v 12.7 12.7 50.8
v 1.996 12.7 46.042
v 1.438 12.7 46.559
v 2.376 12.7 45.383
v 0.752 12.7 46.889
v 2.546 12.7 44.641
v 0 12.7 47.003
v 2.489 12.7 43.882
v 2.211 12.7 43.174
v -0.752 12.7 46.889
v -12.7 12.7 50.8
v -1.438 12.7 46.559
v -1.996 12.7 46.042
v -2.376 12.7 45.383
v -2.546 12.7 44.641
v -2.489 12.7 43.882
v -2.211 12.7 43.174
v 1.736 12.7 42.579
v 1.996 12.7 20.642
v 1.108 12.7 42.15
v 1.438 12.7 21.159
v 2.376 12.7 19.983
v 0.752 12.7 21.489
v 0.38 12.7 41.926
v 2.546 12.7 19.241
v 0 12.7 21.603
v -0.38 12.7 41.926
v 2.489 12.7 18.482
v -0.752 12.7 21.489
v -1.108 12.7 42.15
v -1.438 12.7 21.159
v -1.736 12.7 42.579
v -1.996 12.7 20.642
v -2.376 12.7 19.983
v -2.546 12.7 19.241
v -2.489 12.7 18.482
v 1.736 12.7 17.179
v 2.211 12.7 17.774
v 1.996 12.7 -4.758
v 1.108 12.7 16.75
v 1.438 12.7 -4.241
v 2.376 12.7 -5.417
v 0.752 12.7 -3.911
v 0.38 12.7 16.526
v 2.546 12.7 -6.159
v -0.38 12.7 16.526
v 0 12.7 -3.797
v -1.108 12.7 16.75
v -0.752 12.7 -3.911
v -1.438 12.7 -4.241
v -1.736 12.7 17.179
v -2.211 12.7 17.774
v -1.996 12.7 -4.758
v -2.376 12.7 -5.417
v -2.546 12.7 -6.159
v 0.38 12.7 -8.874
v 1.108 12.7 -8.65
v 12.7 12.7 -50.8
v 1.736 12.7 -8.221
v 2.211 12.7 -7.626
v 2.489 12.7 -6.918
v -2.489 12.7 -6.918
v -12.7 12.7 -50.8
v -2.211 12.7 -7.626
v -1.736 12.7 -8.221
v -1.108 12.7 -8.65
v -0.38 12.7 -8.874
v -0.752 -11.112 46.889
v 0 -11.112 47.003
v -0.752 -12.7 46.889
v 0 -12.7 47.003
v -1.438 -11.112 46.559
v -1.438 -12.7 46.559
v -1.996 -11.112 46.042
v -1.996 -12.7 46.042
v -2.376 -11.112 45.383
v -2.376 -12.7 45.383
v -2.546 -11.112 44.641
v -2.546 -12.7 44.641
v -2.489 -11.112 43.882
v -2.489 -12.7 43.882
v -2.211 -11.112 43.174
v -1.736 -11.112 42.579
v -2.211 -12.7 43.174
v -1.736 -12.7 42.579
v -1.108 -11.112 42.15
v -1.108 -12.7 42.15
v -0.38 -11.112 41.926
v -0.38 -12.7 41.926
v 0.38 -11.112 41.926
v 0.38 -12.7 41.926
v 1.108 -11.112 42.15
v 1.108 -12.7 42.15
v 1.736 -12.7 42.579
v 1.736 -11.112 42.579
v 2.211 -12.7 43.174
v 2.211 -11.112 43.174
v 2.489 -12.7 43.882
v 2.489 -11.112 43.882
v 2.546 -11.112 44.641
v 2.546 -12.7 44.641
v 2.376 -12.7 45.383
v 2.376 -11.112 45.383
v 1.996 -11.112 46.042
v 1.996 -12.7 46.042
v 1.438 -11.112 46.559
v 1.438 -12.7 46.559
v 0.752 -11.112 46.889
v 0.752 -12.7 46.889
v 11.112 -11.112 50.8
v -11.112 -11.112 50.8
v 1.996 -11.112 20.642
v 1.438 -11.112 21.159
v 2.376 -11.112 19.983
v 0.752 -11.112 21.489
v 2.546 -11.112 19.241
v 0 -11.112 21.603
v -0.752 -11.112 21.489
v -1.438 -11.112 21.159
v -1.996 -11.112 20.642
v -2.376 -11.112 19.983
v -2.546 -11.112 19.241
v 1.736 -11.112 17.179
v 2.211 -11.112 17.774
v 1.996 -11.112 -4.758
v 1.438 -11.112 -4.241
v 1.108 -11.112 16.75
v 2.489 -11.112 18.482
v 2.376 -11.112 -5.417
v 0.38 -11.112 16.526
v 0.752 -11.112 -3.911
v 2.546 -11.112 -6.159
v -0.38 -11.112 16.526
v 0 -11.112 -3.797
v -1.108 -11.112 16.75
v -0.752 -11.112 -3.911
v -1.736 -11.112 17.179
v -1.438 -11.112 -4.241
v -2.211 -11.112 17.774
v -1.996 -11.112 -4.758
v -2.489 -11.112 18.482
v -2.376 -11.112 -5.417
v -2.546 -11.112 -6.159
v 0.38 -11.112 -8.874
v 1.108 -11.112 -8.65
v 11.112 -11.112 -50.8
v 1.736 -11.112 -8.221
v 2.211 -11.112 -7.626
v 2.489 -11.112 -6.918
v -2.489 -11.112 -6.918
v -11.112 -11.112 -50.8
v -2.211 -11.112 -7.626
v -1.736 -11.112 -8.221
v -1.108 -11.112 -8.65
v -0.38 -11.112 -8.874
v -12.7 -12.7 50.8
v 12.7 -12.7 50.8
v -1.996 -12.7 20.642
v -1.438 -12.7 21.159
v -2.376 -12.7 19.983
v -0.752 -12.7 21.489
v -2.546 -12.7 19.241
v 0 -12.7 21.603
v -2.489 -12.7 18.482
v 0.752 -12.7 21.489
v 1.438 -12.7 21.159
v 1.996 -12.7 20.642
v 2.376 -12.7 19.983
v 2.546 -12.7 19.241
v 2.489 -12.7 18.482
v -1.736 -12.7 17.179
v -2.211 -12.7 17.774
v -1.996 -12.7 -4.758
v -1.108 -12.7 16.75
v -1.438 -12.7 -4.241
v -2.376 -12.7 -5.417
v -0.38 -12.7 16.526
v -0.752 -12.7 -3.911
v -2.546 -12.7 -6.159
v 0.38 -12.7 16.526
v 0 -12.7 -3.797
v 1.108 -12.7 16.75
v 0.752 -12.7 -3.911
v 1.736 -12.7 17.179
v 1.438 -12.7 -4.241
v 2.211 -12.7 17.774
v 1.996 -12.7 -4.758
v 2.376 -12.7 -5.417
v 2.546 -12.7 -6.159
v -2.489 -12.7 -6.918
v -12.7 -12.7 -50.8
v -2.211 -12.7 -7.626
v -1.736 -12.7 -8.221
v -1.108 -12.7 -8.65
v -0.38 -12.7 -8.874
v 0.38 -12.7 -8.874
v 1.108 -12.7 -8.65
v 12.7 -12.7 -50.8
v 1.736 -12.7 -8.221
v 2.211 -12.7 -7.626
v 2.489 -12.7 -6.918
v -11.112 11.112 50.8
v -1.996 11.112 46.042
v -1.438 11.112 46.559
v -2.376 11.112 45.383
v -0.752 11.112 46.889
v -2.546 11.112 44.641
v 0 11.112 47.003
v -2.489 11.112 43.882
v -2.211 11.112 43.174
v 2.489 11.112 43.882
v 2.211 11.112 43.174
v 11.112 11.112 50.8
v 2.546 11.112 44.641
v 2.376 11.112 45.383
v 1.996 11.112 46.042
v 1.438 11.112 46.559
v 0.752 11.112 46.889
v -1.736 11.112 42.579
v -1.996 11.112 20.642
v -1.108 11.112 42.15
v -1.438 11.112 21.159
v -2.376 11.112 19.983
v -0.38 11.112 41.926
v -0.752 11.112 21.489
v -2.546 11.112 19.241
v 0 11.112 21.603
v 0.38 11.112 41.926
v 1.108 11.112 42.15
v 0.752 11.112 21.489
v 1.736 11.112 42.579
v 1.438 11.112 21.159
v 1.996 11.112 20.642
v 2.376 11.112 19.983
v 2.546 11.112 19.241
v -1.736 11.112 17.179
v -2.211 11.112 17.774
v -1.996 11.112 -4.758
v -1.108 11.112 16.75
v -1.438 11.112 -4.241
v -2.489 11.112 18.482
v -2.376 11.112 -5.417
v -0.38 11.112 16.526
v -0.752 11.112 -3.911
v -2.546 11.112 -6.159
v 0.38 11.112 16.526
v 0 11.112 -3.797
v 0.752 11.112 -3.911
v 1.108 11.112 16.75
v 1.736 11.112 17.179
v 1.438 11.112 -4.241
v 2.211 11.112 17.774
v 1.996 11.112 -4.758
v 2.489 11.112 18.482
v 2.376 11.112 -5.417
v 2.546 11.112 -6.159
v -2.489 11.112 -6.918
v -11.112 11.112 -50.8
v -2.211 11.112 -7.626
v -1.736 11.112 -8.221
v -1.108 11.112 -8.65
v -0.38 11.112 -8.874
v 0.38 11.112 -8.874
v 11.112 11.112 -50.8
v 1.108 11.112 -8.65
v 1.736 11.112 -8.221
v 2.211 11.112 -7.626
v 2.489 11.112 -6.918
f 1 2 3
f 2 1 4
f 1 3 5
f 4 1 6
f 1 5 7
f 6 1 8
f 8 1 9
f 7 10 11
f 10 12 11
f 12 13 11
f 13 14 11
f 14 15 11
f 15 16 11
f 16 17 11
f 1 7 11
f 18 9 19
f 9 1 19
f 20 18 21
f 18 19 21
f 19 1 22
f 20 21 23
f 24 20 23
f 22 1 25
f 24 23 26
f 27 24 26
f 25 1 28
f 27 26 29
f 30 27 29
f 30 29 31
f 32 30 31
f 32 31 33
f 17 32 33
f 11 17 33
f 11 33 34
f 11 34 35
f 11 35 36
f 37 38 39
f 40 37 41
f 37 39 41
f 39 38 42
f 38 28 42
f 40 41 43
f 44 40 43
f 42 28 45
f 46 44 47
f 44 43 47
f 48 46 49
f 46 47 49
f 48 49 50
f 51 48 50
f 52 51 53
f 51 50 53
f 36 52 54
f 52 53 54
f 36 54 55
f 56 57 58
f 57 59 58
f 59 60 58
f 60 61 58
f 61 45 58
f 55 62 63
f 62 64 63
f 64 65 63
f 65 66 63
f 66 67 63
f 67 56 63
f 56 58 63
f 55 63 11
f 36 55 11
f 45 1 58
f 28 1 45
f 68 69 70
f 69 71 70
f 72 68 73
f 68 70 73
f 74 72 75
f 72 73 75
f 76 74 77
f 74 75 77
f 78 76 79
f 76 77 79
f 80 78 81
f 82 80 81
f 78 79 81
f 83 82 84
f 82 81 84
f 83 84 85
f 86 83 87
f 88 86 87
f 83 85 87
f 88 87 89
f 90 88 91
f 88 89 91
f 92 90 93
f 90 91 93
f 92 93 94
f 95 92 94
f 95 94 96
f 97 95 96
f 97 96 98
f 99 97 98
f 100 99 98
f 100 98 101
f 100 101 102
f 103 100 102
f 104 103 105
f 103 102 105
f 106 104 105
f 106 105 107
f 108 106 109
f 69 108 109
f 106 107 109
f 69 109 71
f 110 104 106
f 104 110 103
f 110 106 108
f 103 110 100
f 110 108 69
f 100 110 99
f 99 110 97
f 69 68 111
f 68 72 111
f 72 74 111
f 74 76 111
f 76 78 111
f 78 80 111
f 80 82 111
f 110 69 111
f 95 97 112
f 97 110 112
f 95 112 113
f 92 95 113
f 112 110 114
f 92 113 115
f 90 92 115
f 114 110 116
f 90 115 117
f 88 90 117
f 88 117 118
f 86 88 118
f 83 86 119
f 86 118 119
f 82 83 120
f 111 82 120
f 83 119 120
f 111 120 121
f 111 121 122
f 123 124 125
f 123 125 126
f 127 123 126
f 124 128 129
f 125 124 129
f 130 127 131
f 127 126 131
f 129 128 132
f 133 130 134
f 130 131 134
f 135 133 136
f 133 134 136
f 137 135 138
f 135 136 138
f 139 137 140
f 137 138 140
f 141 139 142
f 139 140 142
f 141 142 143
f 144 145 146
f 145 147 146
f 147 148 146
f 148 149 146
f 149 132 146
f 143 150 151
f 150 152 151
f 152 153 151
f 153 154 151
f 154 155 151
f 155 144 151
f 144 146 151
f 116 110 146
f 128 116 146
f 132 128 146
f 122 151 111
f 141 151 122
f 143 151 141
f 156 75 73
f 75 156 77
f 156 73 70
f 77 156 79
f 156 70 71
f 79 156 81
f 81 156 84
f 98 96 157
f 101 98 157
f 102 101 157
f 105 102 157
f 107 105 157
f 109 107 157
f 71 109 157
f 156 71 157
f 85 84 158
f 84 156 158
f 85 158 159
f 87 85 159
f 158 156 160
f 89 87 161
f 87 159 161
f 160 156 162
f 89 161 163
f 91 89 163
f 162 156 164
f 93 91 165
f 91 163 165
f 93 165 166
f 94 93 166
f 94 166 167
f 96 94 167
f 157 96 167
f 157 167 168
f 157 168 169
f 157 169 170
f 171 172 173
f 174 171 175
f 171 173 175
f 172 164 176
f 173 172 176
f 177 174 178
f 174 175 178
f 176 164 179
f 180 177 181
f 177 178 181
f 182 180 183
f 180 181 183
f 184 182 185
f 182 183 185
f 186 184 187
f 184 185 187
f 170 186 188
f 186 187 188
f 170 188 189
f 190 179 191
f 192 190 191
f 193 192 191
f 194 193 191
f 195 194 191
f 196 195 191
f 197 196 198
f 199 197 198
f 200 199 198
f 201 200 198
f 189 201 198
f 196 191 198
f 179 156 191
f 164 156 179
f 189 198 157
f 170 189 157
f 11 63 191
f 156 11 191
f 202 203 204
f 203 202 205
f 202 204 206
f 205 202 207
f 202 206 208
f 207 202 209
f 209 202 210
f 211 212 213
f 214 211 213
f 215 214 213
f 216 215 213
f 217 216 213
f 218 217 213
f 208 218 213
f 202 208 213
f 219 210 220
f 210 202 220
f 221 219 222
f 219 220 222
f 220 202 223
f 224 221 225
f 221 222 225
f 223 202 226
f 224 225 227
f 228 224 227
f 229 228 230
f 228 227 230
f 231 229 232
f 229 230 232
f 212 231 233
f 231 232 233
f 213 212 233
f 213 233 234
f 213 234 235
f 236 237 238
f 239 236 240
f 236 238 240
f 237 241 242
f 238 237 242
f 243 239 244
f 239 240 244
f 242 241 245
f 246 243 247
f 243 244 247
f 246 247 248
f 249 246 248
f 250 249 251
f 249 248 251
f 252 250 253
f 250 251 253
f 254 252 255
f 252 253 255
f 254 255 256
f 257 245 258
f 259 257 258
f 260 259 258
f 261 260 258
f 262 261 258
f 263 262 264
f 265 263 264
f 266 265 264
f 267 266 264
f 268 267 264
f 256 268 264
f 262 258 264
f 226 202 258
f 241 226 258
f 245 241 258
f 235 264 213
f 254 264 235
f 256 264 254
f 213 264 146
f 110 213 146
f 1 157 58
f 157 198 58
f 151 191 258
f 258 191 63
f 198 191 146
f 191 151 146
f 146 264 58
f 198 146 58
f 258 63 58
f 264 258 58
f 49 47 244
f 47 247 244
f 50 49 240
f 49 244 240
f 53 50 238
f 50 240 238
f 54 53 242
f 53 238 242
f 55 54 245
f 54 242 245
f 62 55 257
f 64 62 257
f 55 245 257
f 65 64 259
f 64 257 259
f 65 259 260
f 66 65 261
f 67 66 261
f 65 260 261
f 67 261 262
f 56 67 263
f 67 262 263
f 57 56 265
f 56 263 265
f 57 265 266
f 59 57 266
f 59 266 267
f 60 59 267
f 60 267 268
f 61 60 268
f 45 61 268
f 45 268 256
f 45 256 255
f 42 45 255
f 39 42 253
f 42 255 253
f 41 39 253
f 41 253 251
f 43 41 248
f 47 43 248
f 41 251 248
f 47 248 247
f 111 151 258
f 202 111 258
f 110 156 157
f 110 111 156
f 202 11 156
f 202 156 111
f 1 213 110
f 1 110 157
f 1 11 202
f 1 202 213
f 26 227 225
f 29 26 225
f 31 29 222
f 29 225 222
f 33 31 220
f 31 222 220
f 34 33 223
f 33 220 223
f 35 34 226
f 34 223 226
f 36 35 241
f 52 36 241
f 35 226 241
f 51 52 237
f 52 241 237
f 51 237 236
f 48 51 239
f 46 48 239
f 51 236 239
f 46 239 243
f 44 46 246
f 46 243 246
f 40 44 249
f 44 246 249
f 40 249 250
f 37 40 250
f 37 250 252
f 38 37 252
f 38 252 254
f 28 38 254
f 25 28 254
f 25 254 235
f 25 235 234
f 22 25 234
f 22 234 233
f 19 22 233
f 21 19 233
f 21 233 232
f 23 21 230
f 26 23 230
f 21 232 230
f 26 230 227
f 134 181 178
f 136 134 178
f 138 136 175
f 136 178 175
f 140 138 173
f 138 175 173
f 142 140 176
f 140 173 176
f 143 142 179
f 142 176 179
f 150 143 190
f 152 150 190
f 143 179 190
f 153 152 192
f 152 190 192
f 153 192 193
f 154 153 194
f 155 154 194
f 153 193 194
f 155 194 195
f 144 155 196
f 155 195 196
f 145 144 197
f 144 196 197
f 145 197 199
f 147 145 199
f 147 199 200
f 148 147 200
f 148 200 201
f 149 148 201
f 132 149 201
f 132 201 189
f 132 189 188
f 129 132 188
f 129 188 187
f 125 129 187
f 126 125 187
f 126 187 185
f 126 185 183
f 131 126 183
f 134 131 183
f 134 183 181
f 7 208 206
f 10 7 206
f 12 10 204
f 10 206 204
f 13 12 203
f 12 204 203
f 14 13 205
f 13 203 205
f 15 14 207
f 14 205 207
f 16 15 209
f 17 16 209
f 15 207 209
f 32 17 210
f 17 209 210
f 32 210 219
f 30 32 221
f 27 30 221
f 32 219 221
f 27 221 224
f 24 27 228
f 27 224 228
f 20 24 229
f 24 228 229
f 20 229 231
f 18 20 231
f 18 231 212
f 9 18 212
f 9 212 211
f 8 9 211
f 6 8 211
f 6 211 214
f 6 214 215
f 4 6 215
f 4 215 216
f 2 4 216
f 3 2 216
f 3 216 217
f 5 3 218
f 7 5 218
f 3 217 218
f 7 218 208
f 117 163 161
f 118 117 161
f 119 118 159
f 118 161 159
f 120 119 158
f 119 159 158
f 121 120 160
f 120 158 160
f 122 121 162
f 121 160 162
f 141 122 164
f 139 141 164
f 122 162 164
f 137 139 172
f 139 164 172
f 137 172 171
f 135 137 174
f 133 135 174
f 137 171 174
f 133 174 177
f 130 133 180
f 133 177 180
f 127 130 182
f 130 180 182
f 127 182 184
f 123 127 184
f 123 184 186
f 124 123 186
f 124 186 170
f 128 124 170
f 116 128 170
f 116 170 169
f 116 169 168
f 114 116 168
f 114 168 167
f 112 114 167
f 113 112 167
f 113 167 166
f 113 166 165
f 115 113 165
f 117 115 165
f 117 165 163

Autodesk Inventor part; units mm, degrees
ref_plane "YZ Plane" through (0, 0, 0) normal (1, 0, 0) x (0, 1, 0)
ref_plane "XZ Plane" through (0, 0, 0) normal (0, 1, 0) x (-1, 0, 0)
ref_plane "XY Plane" through (0, 0, 0) normal (0, 0, 1) x (1, 0, 0)
sketch "Sketch1" plane through (0, 0, 0) normal (0, 0, 1) x (1, 0, 0)
  line L0 (-12.7, -12.7) -> (12.7, -12.7)
  line L1 (12.7, -12.7) -> (12.7, 12.7)
  line L2 (12.7, 12.7) -> (-12.7, 12.7)
  line L3 (-12.7, 12.7) -> (-12.7, -12.7)
  line L4 (-12.7, -12.7) -> (12.7, 12.7) construction
  line L5 (12.7, -12.7) -> (-12.7, 12.7) construction
  line L6 (11.1125, -11.1125) -> (-11.1125, -11.1125)
  line L7 (-11.1125, -11.1125) -> (-11.1125, 11.1125)
  line L8 (-11.1125, 11.1125) -> (11.1125, 11.1125)
  line L9 (11.1125, 11.1125) -> (11.1125, -11.1125)
  line L10 (11.1125, -11.1125) -> (-11.1125, 11.1125) construction
  line L11 (-11.1125, -11.1125) -> (11.1125, 11.1125) construction
  point P0 (0, 0)
  dimension "d0" = 25.4
  dimension "d1" = 25.4
  dimension "d3" = 22.225
  dimension "d4" = 22.225
extrude "Extrusion1" add sketch "Sketch1" along normal mid plane 101.6
sketch "Sketch2" plane through (-12.7, 12.7, 50.8) normal (0, 1, 0) x (1, 0, 0)
  line L0 (25.4, 0) -> (0, 0) projected
  point P0 (12.7, 50.8)
  point P1 (12.7, 6.35)
  point P2 (12.7, 31.75)
  point P3 (12.7, 57.15)
  point P4 (12.7, 0)
  point P5 (12.7, 0)
  dimension "d7" = 6.35
  dimension "d8" = 25.4
  dimension "d9" = 25.4
hole "Hole1" at (0, 12.7, 44.45) at (0, 12.7, 19.05) at (0, 12.7, -6.35) direction (0, -1, 0) diameter 5.1054 end through all clearance for "Flat Head Machine Screw (82)" size "#10" standard "Ansi Unified Screw Threads"
properties part number "DB1-012" material "Aluminum 6061"
